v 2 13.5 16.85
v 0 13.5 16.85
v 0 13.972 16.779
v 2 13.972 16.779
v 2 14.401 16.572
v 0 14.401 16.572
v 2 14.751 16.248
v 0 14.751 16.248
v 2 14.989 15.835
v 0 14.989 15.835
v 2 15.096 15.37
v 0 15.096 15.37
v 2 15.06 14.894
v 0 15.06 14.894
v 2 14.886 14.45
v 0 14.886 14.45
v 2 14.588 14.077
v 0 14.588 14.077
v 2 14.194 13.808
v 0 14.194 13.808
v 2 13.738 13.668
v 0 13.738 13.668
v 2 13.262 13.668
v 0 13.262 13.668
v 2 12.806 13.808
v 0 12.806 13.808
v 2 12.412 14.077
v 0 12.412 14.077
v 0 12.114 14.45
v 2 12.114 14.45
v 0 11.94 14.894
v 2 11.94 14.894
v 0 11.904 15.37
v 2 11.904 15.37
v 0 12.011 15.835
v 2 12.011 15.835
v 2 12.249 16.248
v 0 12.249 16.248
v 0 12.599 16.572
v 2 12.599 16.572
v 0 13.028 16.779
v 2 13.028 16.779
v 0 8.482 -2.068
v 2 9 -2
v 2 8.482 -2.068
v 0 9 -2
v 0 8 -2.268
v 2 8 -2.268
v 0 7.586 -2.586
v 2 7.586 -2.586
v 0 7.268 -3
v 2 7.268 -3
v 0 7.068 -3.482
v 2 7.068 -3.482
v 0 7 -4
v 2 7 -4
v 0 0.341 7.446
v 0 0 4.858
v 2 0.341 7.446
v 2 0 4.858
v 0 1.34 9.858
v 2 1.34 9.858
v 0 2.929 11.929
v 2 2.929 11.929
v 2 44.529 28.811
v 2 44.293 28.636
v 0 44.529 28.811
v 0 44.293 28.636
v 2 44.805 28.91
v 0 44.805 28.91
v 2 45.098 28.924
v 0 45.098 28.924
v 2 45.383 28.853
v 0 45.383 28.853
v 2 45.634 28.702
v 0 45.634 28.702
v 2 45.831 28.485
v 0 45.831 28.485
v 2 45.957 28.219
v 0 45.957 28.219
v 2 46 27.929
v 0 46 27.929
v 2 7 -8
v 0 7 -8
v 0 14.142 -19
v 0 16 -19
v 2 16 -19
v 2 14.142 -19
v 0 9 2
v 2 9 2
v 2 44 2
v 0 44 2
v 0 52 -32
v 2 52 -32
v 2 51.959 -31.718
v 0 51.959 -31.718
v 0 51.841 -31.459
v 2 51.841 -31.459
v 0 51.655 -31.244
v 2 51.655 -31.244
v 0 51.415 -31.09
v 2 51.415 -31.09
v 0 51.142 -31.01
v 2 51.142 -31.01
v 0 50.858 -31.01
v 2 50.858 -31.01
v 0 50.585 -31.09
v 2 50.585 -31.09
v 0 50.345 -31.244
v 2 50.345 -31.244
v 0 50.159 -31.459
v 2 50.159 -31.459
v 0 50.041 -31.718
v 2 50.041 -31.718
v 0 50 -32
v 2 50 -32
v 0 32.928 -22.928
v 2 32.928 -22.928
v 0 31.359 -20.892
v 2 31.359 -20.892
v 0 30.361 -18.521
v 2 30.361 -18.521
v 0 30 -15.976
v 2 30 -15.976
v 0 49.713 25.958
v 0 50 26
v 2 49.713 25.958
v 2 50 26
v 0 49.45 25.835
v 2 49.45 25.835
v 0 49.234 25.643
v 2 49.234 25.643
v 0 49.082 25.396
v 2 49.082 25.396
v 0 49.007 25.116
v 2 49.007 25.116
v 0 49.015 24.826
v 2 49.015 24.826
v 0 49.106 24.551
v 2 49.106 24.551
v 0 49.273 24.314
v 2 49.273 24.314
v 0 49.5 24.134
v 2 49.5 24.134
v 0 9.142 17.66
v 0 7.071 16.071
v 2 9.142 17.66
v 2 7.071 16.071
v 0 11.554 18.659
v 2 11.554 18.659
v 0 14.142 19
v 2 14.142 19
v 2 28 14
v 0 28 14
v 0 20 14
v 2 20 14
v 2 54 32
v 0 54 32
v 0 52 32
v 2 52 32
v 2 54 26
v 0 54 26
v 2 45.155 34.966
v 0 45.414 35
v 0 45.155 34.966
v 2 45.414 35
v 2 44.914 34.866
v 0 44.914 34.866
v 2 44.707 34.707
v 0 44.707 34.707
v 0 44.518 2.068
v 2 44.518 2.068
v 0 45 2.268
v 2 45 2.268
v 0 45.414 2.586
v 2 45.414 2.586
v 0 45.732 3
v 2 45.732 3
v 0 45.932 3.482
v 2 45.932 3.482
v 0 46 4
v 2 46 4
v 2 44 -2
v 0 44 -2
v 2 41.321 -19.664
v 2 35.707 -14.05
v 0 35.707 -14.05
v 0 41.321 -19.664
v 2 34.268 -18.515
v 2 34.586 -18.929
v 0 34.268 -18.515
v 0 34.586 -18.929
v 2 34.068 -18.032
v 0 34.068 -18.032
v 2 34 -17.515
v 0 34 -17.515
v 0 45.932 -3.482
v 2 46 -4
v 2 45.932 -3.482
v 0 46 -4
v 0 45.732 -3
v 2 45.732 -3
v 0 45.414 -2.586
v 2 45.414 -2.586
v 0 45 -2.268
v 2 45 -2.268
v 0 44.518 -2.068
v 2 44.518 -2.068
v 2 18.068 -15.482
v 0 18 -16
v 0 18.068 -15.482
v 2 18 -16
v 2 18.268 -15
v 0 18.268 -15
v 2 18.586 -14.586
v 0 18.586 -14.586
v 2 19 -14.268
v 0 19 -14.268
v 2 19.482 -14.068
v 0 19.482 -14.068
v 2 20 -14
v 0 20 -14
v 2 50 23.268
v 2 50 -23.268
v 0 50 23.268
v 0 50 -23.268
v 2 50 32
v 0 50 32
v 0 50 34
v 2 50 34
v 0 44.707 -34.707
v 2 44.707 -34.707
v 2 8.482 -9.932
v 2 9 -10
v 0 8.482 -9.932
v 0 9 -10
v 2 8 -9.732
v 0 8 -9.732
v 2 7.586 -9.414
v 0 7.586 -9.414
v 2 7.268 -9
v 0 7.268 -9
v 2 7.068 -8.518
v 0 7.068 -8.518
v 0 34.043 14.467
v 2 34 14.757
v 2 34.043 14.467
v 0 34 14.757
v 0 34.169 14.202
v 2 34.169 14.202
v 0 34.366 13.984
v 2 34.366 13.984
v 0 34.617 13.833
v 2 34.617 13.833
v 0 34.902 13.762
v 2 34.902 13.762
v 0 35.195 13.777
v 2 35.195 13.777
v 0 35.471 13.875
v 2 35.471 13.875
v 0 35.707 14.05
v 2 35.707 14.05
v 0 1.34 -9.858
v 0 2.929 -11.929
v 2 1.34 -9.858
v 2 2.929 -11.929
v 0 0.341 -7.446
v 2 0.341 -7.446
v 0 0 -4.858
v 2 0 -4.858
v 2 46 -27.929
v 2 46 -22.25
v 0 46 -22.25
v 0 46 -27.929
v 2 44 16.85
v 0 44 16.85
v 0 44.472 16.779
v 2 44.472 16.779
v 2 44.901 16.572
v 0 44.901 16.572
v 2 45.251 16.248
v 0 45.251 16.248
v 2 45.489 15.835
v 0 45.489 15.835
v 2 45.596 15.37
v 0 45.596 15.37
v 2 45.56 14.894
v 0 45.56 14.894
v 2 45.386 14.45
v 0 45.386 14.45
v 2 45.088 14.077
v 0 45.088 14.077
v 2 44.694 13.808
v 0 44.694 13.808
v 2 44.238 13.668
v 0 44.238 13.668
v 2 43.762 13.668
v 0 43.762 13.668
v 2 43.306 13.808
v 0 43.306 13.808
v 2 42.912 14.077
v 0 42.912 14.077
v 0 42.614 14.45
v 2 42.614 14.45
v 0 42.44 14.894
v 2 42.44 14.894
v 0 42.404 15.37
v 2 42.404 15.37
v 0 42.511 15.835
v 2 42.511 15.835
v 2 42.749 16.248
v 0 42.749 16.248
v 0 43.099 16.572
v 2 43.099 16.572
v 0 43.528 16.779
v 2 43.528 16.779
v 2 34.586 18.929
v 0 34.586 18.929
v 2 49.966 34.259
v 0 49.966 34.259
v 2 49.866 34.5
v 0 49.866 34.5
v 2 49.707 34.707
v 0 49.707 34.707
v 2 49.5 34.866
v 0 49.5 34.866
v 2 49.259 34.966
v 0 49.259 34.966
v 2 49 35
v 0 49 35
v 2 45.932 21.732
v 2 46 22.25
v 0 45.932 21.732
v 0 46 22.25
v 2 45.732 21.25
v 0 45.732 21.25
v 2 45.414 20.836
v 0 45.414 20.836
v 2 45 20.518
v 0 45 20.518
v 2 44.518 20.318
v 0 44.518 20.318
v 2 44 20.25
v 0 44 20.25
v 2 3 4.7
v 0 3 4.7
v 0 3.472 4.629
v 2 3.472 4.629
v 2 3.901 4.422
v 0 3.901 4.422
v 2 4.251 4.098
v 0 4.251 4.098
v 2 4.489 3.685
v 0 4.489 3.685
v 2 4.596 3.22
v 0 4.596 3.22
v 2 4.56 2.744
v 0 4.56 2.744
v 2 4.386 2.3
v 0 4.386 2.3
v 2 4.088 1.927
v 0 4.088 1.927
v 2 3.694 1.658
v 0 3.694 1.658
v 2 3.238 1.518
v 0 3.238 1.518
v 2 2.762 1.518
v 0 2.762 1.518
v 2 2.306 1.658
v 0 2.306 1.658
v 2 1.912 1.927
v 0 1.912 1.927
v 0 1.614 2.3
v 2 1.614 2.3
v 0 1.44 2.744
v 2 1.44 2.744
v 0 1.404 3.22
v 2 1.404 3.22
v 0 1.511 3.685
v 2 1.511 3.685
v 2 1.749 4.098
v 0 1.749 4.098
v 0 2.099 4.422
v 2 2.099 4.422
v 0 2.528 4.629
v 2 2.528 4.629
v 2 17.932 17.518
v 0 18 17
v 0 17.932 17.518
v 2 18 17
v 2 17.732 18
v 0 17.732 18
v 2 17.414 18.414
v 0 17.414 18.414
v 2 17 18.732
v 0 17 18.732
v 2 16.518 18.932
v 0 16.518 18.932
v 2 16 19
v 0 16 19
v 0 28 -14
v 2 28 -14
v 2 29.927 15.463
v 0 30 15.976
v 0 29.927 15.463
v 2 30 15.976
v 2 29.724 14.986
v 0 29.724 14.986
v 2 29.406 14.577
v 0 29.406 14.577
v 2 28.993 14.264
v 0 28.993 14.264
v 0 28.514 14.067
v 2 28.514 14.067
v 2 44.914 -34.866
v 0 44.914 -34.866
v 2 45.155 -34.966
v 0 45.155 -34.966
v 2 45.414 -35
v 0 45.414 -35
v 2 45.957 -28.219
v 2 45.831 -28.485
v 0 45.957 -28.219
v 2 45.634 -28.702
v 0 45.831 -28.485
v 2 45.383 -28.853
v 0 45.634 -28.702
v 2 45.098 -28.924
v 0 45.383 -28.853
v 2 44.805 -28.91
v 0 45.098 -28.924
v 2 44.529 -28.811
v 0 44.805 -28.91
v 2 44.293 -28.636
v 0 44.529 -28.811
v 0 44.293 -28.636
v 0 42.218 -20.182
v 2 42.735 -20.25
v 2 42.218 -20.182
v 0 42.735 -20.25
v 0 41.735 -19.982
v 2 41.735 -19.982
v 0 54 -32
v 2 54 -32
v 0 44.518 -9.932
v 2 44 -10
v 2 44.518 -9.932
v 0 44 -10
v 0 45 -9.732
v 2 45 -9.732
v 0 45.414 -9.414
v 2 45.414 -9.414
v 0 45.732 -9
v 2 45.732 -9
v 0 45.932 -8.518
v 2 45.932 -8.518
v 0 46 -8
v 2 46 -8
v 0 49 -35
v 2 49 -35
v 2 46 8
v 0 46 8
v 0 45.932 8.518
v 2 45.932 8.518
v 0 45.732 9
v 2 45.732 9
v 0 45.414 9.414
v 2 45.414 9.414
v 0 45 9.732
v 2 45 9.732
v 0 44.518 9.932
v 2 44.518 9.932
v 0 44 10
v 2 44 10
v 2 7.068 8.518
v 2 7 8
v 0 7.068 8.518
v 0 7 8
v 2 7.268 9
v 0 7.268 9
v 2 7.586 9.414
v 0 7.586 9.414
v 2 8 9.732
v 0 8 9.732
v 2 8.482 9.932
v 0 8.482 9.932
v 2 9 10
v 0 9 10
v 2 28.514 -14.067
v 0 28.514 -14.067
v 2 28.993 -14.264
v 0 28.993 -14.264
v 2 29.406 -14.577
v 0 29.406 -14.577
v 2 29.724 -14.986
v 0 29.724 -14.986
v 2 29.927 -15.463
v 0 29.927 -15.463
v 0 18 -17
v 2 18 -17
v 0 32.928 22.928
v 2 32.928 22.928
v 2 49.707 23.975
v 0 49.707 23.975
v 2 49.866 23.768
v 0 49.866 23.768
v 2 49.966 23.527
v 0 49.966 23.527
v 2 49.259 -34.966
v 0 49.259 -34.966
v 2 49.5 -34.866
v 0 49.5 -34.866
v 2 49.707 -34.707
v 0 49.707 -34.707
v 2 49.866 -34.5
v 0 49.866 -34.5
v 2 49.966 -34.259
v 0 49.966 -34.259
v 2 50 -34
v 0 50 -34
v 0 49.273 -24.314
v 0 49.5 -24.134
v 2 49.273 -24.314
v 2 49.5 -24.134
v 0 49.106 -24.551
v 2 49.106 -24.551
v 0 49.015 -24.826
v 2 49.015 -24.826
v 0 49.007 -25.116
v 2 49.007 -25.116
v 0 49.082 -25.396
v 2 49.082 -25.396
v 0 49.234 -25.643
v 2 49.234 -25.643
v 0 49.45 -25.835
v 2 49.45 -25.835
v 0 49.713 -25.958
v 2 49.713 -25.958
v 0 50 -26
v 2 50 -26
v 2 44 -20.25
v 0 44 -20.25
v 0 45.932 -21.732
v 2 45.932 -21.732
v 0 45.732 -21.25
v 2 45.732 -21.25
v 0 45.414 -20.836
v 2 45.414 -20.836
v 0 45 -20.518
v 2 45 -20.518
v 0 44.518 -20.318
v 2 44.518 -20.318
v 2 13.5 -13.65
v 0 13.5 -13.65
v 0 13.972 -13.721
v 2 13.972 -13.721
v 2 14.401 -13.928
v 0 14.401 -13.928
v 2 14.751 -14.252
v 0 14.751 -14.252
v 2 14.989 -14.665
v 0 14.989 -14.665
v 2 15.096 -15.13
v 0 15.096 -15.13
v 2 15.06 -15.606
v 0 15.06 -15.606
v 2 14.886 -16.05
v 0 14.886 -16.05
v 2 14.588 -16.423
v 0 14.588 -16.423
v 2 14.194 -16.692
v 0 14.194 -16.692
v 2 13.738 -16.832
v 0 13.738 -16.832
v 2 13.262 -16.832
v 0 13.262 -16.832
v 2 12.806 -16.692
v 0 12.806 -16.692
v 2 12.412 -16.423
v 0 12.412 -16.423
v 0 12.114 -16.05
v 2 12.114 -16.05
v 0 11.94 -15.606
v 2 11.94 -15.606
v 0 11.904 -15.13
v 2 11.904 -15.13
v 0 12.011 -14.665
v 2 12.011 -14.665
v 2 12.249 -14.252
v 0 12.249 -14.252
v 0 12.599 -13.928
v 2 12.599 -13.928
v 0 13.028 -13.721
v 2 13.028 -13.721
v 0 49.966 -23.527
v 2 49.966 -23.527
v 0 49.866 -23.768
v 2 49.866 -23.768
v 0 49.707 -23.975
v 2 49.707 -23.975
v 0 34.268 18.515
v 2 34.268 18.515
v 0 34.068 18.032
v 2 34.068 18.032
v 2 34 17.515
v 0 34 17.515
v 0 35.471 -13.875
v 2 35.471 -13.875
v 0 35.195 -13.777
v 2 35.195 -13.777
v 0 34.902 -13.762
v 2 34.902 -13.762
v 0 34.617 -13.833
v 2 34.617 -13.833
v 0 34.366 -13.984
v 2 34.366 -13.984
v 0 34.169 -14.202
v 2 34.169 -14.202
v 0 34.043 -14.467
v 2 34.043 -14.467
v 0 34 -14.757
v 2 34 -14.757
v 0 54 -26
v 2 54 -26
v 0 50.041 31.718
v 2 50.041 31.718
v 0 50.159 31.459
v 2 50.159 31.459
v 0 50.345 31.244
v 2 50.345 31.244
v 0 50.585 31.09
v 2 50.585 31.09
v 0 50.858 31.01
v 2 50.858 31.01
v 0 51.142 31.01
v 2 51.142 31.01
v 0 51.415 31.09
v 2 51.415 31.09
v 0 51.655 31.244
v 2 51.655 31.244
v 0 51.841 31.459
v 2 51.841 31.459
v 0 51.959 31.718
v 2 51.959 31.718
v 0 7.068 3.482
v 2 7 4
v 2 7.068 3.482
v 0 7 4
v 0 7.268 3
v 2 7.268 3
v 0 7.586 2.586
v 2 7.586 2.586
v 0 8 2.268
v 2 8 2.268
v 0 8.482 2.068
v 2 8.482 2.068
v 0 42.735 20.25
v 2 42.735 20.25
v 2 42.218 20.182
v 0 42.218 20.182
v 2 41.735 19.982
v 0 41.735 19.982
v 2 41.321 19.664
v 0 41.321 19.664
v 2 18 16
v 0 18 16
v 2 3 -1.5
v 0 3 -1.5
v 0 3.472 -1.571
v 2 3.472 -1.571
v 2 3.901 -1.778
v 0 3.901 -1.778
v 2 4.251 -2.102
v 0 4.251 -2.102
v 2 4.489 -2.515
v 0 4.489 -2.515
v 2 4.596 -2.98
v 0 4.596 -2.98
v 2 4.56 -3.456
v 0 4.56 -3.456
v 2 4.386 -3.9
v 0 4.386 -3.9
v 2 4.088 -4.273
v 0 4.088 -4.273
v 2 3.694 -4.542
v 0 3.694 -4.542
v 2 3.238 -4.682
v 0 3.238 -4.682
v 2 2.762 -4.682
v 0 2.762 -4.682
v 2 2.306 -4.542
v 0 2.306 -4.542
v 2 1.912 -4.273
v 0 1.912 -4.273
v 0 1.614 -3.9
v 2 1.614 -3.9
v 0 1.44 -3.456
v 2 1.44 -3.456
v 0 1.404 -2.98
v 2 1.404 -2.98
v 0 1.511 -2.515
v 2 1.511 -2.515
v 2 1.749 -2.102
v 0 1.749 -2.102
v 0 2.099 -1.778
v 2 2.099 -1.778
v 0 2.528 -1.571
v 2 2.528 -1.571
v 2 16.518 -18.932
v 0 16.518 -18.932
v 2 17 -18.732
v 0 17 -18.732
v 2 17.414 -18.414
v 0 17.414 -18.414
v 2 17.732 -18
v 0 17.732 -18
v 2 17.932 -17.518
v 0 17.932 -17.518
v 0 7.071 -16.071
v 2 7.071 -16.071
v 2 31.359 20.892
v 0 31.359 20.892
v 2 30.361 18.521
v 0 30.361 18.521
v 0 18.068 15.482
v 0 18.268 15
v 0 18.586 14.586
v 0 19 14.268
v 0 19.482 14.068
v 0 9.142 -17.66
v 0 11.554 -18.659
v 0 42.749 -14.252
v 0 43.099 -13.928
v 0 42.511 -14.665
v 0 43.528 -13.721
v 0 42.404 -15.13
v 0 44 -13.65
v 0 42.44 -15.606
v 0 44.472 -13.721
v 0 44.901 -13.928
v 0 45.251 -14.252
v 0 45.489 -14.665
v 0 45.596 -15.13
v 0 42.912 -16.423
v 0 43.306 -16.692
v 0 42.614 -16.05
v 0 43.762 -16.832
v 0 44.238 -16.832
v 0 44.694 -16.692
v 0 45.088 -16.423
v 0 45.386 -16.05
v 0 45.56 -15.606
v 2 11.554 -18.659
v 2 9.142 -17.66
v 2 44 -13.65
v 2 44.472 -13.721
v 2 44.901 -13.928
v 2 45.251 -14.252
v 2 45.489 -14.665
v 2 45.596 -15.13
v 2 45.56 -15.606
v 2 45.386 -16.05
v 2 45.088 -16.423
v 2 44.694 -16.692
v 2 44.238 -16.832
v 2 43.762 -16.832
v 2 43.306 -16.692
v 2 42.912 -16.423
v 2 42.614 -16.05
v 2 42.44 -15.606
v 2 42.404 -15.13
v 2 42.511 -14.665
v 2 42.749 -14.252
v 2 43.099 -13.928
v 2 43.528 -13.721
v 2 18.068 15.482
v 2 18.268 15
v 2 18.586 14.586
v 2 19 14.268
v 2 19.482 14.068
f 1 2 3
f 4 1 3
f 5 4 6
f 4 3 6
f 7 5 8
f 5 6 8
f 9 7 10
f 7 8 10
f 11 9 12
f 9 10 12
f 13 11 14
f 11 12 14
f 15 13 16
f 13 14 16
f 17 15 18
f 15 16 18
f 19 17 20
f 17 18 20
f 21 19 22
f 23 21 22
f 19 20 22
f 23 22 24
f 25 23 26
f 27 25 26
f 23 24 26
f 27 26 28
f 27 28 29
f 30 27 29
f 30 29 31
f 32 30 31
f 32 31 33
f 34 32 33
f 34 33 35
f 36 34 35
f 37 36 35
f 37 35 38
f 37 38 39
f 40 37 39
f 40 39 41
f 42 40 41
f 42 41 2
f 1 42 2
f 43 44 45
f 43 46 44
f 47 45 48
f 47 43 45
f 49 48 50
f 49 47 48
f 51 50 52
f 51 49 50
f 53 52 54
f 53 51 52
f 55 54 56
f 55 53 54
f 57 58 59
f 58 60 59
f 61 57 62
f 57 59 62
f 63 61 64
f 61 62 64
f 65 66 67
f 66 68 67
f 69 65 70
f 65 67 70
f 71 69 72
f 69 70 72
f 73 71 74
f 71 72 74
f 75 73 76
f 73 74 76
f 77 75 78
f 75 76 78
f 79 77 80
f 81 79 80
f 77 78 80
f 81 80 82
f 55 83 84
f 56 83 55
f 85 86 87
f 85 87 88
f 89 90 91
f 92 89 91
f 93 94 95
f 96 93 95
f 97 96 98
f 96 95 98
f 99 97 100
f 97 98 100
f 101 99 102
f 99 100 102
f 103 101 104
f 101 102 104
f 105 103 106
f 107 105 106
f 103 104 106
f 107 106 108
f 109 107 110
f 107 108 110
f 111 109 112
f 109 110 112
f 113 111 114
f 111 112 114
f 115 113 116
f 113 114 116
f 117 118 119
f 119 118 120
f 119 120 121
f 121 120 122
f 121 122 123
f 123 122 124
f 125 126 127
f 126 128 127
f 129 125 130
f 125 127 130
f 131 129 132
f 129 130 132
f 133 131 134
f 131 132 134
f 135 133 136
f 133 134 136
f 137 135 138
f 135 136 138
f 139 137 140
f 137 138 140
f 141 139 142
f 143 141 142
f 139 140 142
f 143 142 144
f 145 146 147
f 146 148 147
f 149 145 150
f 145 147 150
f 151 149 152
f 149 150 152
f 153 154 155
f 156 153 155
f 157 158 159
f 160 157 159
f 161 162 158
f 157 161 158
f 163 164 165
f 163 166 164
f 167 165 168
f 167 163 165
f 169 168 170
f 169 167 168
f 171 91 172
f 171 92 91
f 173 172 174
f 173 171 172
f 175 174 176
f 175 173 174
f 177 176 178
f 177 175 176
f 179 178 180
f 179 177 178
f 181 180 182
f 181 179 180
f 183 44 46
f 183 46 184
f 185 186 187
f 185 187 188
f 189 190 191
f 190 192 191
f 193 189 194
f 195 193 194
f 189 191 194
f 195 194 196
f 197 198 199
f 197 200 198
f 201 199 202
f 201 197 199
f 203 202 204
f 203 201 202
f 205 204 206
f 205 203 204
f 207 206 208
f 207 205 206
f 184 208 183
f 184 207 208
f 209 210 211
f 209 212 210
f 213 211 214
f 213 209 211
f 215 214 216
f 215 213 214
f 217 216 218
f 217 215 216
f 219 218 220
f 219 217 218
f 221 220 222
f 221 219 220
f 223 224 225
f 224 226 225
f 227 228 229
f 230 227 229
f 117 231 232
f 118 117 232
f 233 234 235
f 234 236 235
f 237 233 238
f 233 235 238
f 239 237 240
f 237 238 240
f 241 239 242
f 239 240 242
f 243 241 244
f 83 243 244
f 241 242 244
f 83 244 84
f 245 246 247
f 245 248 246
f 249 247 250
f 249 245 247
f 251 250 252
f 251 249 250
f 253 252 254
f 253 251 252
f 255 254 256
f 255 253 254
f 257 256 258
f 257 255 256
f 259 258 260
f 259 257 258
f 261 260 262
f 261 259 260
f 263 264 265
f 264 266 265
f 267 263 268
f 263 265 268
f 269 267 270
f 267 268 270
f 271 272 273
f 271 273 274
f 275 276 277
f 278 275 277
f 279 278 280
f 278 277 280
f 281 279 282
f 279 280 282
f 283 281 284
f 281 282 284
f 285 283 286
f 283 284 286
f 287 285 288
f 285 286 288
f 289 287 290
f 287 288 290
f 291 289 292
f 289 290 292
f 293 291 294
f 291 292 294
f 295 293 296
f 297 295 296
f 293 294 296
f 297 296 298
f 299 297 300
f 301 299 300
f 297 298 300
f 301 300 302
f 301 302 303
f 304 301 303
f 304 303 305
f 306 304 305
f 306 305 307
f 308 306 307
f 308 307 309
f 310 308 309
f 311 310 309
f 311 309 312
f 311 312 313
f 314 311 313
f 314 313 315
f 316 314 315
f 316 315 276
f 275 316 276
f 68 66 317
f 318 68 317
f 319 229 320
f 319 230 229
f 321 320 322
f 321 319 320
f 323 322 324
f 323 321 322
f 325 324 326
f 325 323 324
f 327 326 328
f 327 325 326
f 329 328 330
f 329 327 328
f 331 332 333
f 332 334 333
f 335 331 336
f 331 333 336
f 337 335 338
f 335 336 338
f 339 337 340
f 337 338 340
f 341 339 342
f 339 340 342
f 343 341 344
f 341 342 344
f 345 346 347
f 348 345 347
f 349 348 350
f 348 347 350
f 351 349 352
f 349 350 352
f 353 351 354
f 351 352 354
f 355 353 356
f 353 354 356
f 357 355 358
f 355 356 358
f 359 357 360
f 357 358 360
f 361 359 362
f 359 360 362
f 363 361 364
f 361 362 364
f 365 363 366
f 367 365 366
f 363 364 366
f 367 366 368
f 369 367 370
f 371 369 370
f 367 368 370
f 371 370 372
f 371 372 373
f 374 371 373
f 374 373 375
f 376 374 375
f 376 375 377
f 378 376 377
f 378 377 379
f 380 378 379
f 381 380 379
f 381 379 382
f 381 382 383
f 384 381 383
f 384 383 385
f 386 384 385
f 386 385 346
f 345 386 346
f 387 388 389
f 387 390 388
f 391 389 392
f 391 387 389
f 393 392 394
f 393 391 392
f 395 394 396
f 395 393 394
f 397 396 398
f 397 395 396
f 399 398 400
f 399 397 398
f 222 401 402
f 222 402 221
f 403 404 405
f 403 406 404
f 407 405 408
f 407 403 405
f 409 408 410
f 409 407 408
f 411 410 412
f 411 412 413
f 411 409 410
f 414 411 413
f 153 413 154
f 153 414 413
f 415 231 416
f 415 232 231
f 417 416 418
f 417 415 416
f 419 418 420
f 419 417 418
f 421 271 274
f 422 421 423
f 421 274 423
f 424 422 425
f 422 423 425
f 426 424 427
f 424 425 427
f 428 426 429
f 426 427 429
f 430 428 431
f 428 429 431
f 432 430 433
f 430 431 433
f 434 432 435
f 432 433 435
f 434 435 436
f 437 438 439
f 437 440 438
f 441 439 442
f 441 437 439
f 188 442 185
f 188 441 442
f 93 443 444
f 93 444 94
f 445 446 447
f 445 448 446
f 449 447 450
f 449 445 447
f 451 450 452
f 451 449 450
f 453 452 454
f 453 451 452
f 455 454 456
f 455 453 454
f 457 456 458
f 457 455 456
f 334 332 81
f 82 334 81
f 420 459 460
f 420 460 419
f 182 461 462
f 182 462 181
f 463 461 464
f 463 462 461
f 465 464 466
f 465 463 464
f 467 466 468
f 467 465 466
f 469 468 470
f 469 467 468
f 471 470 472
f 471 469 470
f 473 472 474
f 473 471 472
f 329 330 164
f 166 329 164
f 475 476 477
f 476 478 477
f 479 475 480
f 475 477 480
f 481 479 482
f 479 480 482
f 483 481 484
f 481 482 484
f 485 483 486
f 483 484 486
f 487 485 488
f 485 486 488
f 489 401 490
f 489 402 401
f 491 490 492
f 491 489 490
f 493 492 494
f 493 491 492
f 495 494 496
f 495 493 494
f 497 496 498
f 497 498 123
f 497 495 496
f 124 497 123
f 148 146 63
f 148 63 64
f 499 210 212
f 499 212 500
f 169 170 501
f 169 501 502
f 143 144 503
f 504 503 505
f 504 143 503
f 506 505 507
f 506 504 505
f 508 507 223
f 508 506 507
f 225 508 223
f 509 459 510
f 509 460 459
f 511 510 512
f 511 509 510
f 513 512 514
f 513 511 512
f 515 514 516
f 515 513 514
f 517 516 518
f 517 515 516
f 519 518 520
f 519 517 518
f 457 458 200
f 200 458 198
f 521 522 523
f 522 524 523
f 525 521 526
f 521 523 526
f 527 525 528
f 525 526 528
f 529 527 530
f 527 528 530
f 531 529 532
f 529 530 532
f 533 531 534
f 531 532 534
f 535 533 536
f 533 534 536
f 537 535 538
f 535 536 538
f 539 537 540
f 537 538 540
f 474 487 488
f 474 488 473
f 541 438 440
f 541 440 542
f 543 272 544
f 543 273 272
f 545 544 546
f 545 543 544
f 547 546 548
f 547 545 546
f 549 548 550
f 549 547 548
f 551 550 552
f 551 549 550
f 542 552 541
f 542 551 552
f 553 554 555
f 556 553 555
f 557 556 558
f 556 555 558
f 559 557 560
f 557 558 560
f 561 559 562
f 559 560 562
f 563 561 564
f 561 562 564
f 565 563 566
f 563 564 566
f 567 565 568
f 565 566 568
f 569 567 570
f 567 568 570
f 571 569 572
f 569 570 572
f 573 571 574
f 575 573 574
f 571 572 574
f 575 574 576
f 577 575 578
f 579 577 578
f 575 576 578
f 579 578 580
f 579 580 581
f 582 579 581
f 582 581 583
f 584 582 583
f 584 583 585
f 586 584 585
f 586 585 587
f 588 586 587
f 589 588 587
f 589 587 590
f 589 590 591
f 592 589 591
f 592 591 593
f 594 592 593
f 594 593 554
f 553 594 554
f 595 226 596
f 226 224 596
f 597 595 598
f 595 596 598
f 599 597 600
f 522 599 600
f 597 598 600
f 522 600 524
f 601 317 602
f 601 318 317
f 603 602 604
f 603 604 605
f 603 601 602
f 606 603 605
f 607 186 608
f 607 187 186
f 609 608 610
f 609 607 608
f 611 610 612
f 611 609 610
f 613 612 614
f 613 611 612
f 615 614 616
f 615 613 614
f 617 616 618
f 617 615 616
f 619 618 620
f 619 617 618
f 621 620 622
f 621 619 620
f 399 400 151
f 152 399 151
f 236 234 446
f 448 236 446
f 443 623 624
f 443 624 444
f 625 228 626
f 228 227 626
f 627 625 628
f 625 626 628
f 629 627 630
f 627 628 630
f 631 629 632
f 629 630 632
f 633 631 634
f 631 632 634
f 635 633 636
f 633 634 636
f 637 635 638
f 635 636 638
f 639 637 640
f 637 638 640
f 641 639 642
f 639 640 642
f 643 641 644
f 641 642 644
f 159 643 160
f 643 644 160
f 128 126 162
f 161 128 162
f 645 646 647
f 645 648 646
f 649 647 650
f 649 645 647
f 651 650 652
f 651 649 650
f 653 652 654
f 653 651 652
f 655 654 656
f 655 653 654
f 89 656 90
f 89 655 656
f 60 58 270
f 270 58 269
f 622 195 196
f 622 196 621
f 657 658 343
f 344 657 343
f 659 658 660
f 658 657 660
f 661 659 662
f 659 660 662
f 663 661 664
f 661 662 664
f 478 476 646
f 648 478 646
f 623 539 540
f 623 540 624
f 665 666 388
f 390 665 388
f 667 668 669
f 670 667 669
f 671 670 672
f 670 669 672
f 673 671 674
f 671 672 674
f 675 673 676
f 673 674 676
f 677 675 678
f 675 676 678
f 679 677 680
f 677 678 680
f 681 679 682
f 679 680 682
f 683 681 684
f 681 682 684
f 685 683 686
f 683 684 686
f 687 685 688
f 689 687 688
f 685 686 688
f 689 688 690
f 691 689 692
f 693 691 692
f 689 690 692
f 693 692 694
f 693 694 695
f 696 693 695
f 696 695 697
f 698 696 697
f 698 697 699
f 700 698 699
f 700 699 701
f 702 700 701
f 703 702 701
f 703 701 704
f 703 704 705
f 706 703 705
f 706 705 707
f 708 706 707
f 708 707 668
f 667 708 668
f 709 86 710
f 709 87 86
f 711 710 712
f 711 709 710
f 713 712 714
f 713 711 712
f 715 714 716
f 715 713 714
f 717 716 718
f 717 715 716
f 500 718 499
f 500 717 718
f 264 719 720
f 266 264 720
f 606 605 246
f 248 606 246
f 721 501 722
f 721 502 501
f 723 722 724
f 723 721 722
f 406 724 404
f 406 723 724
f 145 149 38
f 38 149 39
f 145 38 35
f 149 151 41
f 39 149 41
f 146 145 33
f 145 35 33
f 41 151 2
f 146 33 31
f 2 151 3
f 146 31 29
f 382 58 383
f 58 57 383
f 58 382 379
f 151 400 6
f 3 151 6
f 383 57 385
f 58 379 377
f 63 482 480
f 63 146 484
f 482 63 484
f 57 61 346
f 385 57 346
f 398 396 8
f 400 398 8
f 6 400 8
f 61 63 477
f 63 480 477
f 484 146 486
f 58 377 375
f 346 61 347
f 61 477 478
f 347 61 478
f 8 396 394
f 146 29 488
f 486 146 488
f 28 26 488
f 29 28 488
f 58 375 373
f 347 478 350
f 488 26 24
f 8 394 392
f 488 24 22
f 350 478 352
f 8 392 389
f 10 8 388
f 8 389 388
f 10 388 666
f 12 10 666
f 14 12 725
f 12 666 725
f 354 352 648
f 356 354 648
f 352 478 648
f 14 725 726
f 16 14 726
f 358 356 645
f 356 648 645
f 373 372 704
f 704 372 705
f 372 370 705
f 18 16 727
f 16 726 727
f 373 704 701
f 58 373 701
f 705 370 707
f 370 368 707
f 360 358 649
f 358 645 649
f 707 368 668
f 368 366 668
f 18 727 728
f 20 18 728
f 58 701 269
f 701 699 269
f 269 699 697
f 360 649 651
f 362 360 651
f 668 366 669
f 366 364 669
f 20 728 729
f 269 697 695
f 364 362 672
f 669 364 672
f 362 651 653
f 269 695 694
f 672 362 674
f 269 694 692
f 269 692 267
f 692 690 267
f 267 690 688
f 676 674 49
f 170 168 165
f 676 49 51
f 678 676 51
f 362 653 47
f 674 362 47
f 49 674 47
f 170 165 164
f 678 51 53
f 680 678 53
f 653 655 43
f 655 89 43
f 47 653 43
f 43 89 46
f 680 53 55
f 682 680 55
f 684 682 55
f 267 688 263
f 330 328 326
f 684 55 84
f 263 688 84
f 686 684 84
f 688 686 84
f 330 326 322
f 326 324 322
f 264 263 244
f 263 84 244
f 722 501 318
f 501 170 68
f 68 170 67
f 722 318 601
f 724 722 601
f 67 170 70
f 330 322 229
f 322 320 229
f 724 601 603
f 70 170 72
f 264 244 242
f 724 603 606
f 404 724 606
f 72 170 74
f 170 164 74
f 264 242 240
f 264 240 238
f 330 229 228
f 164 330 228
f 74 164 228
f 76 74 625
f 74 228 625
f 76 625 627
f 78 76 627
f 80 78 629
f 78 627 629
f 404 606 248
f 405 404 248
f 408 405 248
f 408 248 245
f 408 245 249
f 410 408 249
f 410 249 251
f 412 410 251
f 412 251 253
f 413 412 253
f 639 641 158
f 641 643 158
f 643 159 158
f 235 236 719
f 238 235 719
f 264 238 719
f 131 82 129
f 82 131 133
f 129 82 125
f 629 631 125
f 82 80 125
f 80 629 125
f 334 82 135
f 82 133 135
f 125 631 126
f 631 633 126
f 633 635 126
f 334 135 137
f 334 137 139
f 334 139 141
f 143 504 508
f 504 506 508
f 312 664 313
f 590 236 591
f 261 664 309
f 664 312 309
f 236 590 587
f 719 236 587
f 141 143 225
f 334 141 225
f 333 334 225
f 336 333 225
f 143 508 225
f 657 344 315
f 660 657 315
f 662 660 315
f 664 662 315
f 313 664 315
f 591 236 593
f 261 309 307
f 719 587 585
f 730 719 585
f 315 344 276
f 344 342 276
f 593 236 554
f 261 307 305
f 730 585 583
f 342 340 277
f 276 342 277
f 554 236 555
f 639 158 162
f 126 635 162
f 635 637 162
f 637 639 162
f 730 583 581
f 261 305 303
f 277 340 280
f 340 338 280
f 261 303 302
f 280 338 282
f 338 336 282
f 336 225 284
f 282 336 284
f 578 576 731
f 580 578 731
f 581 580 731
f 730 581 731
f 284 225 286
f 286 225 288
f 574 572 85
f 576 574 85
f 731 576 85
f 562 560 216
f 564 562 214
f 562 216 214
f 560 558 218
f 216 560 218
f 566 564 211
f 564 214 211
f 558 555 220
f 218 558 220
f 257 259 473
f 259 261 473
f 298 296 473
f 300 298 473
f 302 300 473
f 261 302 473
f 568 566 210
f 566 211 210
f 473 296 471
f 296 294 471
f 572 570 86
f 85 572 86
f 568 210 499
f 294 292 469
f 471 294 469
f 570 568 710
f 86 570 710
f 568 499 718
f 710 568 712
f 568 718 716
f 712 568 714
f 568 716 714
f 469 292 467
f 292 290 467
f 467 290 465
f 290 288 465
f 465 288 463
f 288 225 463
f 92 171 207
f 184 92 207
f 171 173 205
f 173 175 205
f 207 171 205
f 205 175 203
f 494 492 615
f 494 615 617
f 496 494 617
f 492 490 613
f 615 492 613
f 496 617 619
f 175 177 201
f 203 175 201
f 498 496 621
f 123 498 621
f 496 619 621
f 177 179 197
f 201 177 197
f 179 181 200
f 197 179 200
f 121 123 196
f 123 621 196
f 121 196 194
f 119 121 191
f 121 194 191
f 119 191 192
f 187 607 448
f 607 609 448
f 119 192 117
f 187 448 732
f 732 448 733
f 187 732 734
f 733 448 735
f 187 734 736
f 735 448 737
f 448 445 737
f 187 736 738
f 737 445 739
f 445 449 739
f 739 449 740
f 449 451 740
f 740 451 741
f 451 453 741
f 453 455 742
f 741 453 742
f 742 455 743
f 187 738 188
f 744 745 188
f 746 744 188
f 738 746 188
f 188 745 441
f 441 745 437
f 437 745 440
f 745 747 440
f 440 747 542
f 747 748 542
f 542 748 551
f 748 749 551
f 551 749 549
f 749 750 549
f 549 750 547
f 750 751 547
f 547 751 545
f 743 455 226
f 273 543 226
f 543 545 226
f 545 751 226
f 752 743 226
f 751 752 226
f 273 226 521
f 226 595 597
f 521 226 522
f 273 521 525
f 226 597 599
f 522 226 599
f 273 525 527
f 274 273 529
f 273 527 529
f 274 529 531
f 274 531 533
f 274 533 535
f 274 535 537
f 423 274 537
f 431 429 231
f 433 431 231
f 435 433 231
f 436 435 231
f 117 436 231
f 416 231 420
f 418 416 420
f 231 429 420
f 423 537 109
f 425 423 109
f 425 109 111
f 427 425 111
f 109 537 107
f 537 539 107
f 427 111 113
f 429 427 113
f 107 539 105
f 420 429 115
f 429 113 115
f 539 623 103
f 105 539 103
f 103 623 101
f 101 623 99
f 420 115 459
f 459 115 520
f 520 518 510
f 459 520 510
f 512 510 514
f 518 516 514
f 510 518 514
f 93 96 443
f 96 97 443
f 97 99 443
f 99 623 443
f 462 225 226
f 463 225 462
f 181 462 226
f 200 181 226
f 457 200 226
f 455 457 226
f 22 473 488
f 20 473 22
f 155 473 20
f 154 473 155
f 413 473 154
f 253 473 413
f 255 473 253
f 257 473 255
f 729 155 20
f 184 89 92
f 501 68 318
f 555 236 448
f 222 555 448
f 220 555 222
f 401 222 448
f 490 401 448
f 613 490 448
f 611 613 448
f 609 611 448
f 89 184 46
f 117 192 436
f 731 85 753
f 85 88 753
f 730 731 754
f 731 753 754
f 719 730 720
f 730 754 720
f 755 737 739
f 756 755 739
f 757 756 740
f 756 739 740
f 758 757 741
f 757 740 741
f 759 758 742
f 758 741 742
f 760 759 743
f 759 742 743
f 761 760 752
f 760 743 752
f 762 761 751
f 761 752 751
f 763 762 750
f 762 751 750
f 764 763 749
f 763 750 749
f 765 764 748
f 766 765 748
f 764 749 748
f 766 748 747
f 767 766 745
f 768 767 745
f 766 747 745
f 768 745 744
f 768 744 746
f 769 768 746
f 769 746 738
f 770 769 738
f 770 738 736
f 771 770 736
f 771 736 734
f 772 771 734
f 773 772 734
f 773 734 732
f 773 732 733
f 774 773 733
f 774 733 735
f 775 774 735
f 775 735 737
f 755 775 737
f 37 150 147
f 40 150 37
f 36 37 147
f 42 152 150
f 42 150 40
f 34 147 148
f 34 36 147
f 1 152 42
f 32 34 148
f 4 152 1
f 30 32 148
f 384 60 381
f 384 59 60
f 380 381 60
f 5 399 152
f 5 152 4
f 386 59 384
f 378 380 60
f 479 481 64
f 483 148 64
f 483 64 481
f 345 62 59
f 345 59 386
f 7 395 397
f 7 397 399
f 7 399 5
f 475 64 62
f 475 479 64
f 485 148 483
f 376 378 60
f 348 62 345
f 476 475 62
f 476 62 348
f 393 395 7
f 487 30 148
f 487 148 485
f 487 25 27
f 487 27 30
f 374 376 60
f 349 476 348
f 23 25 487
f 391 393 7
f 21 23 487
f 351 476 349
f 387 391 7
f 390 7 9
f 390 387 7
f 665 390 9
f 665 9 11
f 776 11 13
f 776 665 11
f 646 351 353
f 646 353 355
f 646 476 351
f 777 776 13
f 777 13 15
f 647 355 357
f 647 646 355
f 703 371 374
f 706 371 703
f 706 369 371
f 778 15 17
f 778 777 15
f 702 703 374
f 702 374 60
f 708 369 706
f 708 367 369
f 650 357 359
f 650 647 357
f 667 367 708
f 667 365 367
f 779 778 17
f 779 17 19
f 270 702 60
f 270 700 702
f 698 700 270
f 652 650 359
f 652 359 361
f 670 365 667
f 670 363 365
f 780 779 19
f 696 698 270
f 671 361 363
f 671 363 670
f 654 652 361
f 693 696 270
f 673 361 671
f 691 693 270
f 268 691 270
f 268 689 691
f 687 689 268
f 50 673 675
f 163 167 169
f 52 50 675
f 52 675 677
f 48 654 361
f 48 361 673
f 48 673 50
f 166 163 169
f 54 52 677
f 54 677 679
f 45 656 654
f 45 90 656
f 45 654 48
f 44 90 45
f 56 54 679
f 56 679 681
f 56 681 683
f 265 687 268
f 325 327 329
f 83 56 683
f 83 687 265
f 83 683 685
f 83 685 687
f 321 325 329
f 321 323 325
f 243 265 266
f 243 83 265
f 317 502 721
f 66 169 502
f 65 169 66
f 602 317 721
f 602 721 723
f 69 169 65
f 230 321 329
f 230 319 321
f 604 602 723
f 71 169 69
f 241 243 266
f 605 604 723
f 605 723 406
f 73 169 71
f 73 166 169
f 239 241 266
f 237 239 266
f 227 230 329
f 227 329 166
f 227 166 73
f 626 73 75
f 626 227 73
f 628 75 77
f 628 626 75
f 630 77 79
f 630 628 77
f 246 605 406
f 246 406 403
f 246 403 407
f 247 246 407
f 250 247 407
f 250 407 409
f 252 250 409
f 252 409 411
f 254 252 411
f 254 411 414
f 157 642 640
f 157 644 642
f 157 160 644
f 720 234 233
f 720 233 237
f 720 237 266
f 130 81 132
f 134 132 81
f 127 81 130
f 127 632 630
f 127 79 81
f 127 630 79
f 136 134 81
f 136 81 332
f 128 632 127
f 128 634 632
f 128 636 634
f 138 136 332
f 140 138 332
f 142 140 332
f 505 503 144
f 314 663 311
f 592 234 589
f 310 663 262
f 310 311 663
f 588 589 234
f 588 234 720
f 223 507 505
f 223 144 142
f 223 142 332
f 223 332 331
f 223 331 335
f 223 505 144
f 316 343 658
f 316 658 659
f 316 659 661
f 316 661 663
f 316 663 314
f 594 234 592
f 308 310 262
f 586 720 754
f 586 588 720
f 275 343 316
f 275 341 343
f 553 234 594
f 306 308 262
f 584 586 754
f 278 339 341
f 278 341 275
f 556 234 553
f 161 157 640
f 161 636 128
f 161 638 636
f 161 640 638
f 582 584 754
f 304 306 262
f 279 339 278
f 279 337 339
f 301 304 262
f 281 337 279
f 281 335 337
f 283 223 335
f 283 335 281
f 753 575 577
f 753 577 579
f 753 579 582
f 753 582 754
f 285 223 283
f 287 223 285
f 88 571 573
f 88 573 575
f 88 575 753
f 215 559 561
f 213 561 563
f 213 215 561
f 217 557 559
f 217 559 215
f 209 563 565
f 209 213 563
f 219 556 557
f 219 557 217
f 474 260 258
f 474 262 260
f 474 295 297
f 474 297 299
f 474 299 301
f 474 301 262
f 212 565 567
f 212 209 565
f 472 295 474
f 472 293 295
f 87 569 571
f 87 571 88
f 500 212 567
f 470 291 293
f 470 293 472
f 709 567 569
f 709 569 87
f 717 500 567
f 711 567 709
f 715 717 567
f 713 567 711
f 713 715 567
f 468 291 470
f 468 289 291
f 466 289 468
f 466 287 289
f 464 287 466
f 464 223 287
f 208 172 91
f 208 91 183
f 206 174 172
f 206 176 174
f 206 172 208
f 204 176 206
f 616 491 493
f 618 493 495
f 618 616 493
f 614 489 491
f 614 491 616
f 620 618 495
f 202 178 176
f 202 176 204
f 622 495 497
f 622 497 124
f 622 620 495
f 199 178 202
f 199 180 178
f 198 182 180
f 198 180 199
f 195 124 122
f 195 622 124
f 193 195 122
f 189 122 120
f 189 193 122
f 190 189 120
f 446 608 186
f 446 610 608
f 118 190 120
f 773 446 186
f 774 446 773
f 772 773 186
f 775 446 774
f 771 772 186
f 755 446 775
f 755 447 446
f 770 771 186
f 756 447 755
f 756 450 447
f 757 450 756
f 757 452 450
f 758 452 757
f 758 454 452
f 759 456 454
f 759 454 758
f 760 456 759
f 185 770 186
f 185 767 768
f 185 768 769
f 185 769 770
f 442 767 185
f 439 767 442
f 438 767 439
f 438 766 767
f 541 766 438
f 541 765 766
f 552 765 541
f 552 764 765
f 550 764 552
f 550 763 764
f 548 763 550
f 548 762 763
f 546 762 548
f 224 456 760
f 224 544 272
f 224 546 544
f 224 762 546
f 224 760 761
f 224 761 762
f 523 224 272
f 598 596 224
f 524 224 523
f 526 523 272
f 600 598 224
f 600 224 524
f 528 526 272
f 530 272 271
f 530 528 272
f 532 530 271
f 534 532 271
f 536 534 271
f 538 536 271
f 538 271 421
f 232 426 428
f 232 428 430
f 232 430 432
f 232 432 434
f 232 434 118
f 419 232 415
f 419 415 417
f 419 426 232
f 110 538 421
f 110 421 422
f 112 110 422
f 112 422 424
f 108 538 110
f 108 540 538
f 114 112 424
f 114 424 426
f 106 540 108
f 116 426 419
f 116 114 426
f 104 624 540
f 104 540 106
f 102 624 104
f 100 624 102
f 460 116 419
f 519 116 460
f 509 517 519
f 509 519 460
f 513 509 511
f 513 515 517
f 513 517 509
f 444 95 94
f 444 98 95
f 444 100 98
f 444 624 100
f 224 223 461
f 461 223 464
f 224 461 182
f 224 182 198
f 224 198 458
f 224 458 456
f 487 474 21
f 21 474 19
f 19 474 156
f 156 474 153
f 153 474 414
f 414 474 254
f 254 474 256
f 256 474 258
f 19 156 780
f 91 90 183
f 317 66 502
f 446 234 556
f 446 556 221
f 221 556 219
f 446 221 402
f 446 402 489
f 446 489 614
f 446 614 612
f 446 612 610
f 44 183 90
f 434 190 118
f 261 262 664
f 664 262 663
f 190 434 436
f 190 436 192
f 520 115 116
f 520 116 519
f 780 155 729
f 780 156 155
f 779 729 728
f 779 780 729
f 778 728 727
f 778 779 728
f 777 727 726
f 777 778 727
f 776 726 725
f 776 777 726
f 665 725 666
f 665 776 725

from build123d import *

# Parameters (mm, degrees)
EXTRUDE_1_DEPTH        = 2
HOLE_WIZARD_M3_1_D     = 3.2
HOLE_WIZARD_M3_2_D     = 3.2
CHAMFER_1_SIZE         = 15
FILLET_1_R             = 2
CHAMFER_2_SIZE         = 10
SKETCH_6_W             = 8
SKETCH_6_H             = 39
CUT_EXTRUDE_1_DEPTH    = 100
FILLET_2_R             = 1
FILLET_3_R             = 2
FILLET_2_OF_MIRROR_2_R = 1
FILLET_3_OF_MIRROR_2_R = 2
SKETCH_8_R             = 1
CUT_EXTRUDE_2_DEPTH    = 10
FILLET_4_R             = 1
FILLET_5_R             = 10
FILLET_6_R             = 1


with BuildPart() as part:
    # 草图1 → 凸台-拉伸1 (new body)
    with BuildSketch(Plane(origin=(0, 0, 0), x_dir=(0, 0, -1), z_dir=(1, 0, 0))):
        Polygon((0, 50), (26, 50), (26, 54), (32, 54), (32, 50), (35, 50), (35, 30), (14, 30), (14, 18), (19, 18), (19, 0), (0, 0), align=None)
    extrude_1 = extrude(amount=EXTRUDE_1_DEPTH)

    # 镜向1: 凸台-拉伸1 across plane
    add(extrude_1.mirror(Plane(origin=(2, 0, 0), x_dir=(1, 0, 0), z_dir=(0, 0, -1))))

    # M3 间隙孔1 (through all)
    with Locations(Plane(origin=(2, 0, 0), x_dir=(0, 0, -1), z_dir=(1, 0, 0))):
        with Locations((-15.25, 44), (-15.25, 13.5), (15.25, 13.5), (15.25, 44)):
            Hole(HOLE_WIZARD_M3_1_D / 2)

    # M3 间隙孔2 (through all)
    with Locations(Plane(origin=(2, 0, 0), x_dir=(0, 0, -1), z_dir=(1, 0, 0))):
        with Locations((-3.1, 3), (3.1, 3)):
            Hole(HOLE_WIZARD_M3_2_D / 2)

    # 倒角1
    chamfer_1_edges = [part.edges().sort_by_distance(p)[0] for p in [
        (1, 30, -35),
        (1, 30, 35),
    ]]
    chamfer(chamfer_1_edges, length=CHAMFER_1_SIZE)

    # 圆角1
    fillet_1_edges = [part.edges().sort_by_distance(p)[0] for p in [
        (1, 30, -14),
        (1, 18, -14),
        (1, 18, -19),
        (1, 30, 14),
        (1, 18, 14),
        (1, 18, 19),
    ]]
    fillet(fillet_1_edges, radius=FILLET_1_R)

    # 倒角2
    chamfer_2_edges = [part.edges().sort_by_distance(p)[0] for p in [
        (1, 0, -19),
        (1, 0, 19),
    ]]
    chamfer(chamfer_2_edges, length=CHAMFER_2_SIZE)

    # 草图6 → 切除-拉伸1 (cut)
    with BuildSketch(Plane(origin=(2, 0, 0), x_dir=(0, 0, -1), z_dir=(1, 0, 0))):
        with Locations((-6, 26.5)):
            Rectangle(SKETCH_6_W, SKETCH_6_H)
        Polygon((-30.343145751, 46), (-18.343145751, 34), (-12.343145751, 34), (-20.25, 41.906854249), (-20.25, 46), (-24.343145751, 46), align=None)
    cut_extrude_1 = extrude(amount=-CUT_EXTRUDE_1_DEPTH, mode=Mode.SUBTRACT)

    # 圆角2
    fillet_2_edges = [part.edges().sort_by_distance(p)[0] for p in [
        (1, 46, 30.343145751),
        (1, 34, 12.343145751),
    ]]
    fillet(fillet_2_edges, radius=FILLET_2_R)

    # 圆角3
    fillet_3_edges = [part.edges().sort_by_distance(p)[0] for p in [
        (1, 7, 10),
        (1, 46, 10),
        (1, 46, 2),
        (1, 7, 2),
        (1, 46, 20.25),
        (1, 41.906854249, 20.25),
        (1, 34, 18.343145751),
    ]]
    fillet(fillet_3_edges, radius=FILLET_3_R)

    # 镜向2: 切除-拉伸1 across plane
    add(cut_extrude_1.mirror(Plane.XY), mode=Mode.SUBTRACT)

    # 圆角2 of 镜向2
    fillet_2_of_mirror_2_edges = [part.edges().sort_by_distance(p)[0] for p in [
        (1, 46, -30.343145751),
        (1, 34, -12.343145751),
    ]]
    fillet(fillet_2_of_mirror_2_edges, radius=FILLET_2_OF_MIRROR_2_R)

    # 圆角3 of 镜向2
    fillet_3_of_mirror_2_edges = [part.edges().sort_by_distance(p)[0] for p in [
        (1, 7, -10),
        (1, 46, -10),
        (1, 46, -2),
        (1, 7, -2),
        (1, 46, -20.25),
        (1, 41.906854249, -20.25),
        (1, 34, -18.343145751),
    ]]
    fillet(fillet_3_of_mirror_2_edges, radius=FILLET_3_OF_MIRROR_2_R)

    # 草图8 → 切除-拉伸2 (cut)
    with BuildSketch(Plane(origin=(2, 0, 0), x_dir=(0, 0, -1), z_dir=(1, 0, 0))):
        with Locations((-25, 50)):
            Circle(SKETCH_8_R)
        with Locations((-32, 51)):
            Circle(SKETCH_8_R)
        with Locations((32, 51)):
            Circle(SKETCH_8_R)
        with Locations((25, 50)):
            Circle(SKETCH_8_R)
    extrude(amount=-CUT_EXTRUDE_2_DEPTH, mode=Mode.SUBTRACT)

    # 圆角4
    fillet_4_edges = [part.edges().sort_by_distance(p)[0] for p in [
        (1, 50, -24),
        (1, 50, 24),
    ]]
    fillet(fillet_4_edges, radius=FILLET_4_R)

    # 圆角5
    fillet_5_edges = [part.edges().sort_by_distance(p)[0] for p in [
        (1, 30, -20),
        (1, 10, -19),
        (1, 0, -9),
        (1, 30, 20),
        (1, 10, 19),
        (1, 0, 9),
    ]]
    fillet(fillet_5_edges, radius=FILLET_5_R)

    # 圆角6
    fillet_6_edges = [part.edges().sort_by_distance(p)[0] for p in [
        (1, 45, 35),
        (1, 50, -35),
        (1, 50, 35),
        (1, 45, -35),
    ]]
    fillet(fillet_6_edges, radius=FILLET_6_R)


solid = part.part
